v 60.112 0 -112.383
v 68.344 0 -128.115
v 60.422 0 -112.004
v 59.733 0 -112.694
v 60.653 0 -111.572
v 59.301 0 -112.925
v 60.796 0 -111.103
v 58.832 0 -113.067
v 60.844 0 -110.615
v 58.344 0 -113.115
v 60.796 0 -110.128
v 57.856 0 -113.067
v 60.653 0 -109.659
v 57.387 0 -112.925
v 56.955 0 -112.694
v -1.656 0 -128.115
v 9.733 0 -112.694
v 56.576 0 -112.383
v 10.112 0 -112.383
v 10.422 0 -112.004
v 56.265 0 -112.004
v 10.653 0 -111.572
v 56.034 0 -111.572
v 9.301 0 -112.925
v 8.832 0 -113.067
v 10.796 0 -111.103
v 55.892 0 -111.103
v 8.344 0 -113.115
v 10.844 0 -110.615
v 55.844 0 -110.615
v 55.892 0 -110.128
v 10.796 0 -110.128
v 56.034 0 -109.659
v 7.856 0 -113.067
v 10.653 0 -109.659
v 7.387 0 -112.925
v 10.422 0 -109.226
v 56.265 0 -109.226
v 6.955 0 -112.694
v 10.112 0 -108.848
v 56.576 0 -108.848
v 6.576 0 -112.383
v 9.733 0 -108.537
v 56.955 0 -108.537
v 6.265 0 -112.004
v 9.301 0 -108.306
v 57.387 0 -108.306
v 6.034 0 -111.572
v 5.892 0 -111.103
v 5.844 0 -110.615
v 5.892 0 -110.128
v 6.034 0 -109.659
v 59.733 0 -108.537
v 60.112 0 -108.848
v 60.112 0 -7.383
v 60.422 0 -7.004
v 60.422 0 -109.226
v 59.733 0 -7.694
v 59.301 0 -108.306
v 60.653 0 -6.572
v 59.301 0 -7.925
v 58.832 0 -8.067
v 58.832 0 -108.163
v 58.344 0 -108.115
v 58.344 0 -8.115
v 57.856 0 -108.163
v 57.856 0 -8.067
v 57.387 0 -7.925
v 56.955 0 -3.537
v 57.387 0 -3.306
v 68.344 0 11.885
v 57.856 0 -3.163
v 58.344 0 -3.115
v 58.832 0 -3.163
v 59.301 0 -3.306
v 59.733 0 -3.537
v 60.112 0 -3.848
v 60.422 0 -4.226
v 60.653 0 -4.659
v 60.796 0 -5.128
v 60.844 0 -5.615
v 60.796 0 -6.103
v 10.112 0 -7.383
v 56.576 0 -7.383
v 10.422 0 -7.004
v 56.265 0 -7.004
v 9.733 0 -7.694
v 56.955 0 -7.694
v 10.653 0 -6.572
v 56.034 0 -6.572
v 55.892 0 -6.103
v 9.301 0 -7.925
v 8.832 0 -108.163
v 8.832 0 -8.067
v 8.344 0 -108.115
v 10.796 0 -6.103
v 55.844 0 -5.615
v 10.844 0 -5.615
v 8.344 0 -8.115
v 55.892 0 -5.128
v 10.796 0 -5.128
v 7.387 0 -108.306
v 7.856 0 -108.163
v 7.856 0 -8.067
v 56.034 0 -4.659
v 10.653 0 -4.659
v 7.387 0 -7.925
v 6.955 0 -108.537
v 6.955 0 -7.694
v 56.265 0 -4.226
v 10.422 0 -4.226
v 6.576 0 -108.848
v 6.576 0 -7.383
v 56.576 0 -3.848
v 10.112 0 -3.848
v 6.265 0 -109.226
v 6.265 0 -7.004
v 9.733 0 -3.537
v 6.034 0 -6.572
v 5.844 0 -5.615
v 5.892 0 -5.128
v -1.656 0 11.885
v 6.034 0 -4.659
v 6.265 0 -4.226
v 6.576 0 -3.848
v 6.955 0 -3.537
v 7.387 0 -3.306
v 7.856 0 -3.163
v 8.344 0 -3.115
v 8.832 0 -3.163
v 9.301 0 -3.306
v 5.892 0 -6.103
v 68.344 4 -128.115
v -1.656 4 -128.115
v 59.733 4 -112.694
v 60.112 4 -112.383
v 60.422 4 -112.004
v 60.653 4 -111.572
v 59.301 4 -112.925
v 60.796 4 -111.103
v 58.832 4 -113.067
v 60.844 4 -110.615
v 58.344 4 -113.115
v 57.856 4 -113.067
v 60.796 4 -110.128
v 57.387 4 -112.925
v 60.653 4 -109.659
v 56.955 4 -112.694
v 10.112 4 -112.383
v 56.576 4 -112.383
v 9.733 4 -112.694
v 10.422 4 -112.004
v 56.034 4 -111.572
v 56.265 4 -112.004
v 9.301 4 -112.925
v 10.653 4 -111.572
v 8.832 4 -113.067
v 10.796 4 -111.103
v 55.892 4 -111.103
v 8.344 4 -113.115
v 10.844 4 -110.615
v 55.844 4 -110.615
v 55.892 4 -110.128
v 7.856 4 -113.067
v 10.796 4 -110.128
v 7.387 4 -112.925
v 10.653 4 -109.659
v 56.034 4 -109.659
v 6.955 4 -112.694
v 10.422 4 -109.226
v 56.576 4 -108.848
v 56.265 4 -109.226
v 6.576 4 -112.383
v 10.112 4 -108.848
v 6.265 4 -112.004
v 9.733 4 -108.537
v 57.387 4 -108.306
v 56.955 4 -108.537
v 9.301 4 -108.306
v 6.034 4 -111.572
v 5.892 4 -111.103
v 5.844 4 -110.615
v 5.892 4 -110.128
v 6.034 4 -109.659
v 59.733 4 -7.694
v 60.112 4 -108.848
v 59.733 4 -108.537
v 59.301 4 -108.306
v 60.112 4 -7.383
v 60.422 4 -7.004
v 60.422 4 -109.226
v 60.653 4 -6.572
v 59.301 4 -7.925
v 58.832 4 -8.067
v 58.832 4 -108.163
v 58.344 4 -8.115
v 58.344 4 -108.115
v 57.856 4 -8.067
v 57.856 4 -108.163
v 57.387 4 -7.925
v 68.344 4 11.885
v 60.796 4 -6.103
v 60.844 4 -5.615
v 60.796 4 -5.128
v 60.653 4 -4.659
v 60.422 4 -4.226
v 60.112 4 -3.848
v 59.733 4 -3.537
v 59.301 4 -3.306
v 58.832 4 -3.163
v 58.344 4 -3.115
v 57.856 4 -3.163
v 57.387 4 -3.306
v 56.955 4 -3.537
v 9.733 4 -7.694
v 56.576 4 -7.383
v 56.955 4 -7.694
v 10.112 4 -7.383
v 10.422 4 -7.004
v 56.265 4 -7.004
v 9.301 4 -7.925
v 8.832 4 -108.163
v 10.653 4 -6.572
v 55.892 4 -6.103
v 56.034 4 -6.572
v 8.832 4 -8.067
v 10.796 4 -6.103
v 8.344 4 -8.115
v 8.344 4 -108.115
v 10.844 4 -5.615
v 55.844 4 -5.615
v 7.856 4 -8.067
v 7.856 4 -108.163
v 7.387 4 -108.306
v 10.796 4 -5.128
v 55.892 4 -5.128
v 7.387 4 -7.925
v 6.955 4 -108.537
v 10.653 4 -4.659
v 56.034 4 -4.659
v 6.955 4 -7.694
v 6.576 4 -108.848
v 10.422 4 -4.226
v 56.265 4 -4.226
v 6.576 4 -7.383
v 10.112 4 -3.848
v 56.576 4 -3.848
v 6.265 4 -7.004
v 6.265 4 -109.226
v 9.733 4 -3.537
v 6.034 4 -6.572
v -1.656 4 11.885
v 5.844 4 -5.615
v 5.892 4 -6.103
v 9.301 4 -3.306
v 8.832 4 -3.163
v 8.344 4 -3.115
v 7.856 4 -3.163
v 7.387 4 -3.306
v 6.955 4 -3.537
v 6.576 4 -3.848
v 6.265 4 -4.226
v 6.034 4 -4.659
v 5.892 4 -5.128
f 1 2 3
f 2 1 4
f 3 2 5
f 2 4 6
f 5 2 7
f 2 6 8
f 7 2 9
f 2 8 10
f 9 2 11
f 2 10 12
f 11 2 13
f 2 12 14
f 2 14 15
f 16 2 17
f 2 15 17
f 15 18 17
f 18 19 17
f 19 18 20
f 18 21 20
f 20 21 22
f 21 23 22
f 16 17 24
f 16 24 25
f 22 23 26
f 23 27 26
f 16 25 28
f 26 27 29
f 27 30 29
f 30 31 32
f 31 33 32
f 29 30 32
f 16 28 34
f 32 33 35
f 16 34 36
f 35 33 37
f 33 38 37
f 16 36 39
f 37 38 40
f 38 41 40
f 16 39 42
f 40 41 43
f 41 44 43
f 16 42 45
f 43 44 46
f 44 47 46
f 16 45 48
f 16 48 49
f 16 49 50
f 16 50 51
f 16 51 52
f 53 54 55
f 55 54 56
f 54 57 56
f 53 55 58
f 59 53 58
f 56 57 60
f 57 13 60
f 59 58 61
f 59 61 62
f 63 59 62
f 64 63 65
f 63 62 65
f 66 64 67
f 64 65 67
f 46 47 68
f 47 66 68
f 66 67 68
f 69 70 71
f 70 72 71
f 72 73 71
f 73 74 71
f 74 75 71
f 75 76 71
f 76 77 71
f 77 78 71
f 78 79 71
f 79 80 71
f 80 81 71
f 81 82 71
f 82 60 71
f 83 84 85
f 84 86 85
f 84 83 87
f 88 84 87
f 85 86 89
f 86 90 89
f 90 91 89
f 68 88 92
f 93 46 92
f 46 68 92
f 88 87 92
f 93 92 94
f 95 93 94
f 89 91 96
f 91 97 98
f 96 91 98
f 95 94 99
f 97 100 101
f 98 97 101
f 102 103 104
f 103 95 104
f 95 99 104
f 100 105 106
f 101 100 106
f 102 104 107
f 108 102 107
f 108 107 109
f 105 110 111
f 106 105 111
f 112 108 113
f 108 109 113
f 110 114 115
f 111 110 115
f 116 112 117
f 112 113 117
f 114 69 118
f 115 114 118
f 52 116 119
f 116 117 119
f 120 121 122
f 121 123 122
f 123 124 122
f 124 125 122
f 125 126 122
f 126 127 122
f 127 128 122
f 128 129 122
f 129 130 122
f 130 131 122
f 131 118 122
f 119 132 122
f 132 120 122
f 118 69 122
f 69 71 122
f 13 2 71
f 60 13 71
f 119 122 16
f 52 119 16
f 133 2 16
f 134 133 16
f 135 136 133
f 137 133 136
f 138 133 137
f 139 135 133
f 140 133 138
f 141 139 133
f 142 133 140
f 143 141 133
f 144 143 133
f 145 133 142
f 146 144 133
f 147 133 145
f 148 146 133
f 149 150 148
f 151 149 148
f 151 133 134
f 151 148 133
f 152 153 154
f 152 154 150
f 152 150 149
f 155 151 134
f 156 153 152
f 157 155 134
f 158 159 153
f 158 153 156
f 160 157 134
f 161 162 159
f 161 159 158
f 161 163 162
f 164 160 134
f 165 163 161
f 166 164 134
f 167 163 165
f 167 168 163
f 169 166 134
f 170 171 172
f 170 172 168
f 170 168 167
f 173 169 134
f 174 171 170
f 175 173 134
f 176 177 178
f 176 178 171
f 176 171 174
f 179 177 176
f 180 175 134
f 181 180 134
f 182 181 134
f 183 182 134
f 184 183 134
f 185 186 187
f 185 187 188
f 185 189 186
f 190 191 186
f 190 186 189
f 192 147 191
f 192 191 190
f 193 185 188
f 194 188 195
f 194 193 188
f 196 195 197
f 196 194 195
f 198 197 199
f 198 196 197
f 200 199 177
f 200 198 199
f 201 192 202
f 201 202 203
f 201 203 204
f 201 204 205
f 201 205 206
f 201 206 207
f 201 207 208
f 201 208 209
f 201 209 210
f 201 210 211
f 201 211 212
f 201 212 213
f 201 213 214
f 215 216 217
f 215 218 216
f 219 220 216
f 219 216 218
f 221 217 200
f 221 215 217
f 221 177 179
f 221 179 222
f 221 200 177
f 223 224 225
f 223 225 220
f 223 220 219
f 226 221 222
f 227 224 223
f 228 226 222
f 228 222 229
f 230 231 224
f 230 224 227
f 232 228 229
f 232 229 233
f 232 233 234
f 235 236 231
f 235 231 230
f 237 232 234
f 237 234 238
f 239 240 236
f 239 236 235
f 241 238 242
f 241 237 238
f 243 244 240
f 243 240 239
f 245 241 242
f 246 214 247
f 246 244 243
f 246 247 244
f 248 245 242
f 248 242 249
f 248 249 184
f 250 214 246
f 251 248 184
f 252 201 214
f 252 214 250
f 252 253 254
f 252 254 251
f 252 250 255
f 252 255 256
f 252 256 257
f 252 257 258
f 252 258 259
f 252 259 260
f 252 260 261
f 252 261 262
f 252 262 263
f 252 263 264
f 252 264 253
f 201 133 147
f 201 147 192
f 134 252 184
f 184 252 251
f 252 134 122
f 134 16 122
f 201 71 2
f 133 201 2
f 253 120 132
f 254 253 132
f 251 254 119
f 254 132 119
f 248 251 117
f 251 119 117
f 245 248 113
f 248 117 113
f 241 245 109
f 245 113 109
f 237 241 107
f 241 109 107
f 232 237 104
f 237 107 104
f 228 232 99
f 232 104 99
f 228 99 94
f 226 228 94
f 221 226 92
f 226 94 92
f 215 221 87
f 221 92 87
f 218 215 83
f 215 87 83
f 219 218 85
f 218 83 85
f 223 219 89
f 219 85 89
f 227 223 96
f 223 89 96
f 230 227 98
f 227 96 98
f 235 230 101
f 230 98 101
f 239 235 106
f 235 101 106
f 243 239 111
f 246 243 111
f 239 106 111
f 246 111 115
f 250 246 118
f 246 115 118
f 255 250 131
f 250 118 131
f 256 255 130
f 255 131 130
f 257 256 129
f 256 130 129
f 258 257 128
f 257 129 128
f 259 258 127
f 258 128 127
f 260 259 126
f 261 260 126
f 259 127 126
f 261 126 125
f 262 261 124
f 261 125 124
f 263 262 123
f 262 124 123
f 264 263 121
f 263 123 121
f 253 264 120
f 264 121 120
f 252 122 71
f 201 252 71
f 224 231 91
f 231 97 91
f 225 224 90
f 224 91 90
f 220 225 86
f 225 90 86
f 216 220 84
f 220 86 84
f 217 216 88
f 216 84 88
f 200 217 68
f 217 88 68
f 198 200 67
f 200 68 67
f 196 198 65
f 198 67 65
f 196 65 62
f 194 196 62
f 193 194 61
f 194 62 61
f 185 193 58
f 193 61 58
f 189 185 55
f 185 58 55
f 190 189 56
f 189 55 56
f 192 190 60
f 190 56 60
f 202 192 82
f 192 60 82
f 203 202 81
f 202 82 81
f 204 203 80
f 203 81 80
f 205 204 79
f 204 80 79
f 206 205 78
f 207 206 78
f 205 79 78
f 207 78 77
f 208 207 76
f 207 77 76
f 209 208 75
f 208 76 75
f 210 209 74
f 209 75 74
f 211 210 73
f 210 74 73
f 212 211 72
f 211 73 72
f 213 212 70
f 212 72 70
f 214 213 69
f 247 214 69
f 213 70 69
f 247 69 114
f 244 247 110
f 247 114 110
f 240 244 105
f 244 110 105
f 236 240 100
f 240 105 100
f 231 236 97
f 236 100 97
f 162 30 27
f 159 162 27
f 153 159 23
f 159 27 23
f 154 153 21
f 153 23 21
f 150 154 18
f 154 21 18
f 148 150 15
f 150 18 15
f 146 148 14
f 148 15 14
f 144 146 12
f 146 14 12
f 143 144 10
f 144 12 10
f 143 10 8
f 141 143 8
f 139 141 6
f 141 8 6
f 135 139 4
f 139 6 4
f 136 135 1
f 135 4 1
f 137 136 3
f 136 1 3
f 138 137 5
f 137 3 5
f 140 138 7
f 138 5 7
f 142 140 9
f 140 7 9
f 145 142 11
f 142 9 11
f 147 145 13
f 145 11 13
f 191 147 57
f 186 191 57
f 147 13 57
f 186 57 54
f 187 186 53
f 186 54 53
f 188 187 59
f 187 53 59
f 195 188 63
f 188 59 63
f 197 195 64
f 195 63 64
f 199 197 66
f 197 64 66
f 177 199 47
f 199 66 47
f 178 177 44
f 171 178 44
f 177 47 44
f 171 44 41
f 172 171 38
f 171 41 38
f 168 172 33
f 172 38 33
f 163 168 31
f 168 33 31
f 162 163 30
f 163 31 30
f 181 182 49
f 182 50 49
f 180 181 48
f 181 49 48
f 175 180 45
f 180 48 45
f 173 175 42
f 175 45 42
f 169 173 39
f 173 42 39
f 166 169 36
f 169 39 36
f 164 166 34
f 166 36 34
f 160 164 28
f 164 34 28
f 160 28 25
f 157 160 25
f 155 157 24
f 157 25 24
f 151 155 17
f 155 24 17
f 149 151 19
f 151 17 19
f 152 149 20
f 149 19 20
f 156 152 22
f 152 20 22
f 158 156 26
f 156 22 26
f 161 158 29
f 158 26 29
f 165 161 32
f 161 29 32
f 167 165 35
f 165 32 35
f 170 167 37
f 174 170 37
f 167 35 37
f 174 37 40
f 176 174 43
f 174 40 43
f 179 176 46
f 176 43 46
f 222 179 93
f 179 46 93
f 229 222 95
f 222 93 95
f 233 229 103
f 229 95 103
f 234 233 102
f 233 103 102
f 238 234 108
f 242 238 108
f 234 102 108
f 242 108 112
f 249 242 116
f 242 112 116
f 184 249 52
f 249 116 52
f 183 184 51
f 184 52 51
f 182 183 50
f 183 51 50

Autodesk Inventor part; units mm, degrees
ref_plane "YZ Plane" through (0, 0, 0) normal (1, 0, 0) x (0, 1, 0)
ref_plane "XZ Plane" through (0, 0, 0) normal (0, 1, 0) x (-1, 0, 0)
ref_plane "XY Plane" through (0, 0, 0) normal (0, 0, 1) x (1, 0, 0)
sketch "Sketch1" plane through (0, 0, 0) normal (0, 1, 0) x (-1, 0, 0)
  line L0 (1.6562, 11.8846) -> (-68.3438, 11.8846)
  line L1 (-68.3438, 11.8846) -> (-68.3438, -128.1154)
  line L2 (-68.3438, -128.1154) -> (1.6562, -128.1154)
  line L3 (1.6562, -128.1154) -> (1.6562, 11.8846)
  line L4 (-8.3438, -5.6154) -> (-58.3438, -5.6154)
  line L5 (-58.3438, -5.6154) -> (-58.3438, -110.6154)
  line L6 (-58.3438, -110.6154) -> (-8.3438, -110.6154)
  line L7 (-8.3438, -110.6154) -> (-8.3438, -5.6154)
  circle A0 centre (-8.3438, -5.6154) radius 2.5
  circle A1 centre (-8.3438, -110.6154) radius 2.5
  circle A2 centre (-58.3438, -5.6154) radius 2.5
  circle A3 centre (-58.3438, -110.6154) radius 2.5
  point P0 (0, 0)
  dimension "d0" = 70
  dimension "d1" = 140
  dimension "d2" = 50
  dimension "d3" = 105
  dimension "d4" = 17.5
  dimension "d5" = 10
  dimension "d6" = 5
  dimension "d7" = 5
  dimension "d8" = 5
  dimension "d9" = 5
extrude "Extrusion1" add sketch "Sketch1" along normal blind 4 contours L3 L2 L1 L0 | L4 A0 L7 A1 L6 A3 L5 A2
properties part number "rackmountplate"
